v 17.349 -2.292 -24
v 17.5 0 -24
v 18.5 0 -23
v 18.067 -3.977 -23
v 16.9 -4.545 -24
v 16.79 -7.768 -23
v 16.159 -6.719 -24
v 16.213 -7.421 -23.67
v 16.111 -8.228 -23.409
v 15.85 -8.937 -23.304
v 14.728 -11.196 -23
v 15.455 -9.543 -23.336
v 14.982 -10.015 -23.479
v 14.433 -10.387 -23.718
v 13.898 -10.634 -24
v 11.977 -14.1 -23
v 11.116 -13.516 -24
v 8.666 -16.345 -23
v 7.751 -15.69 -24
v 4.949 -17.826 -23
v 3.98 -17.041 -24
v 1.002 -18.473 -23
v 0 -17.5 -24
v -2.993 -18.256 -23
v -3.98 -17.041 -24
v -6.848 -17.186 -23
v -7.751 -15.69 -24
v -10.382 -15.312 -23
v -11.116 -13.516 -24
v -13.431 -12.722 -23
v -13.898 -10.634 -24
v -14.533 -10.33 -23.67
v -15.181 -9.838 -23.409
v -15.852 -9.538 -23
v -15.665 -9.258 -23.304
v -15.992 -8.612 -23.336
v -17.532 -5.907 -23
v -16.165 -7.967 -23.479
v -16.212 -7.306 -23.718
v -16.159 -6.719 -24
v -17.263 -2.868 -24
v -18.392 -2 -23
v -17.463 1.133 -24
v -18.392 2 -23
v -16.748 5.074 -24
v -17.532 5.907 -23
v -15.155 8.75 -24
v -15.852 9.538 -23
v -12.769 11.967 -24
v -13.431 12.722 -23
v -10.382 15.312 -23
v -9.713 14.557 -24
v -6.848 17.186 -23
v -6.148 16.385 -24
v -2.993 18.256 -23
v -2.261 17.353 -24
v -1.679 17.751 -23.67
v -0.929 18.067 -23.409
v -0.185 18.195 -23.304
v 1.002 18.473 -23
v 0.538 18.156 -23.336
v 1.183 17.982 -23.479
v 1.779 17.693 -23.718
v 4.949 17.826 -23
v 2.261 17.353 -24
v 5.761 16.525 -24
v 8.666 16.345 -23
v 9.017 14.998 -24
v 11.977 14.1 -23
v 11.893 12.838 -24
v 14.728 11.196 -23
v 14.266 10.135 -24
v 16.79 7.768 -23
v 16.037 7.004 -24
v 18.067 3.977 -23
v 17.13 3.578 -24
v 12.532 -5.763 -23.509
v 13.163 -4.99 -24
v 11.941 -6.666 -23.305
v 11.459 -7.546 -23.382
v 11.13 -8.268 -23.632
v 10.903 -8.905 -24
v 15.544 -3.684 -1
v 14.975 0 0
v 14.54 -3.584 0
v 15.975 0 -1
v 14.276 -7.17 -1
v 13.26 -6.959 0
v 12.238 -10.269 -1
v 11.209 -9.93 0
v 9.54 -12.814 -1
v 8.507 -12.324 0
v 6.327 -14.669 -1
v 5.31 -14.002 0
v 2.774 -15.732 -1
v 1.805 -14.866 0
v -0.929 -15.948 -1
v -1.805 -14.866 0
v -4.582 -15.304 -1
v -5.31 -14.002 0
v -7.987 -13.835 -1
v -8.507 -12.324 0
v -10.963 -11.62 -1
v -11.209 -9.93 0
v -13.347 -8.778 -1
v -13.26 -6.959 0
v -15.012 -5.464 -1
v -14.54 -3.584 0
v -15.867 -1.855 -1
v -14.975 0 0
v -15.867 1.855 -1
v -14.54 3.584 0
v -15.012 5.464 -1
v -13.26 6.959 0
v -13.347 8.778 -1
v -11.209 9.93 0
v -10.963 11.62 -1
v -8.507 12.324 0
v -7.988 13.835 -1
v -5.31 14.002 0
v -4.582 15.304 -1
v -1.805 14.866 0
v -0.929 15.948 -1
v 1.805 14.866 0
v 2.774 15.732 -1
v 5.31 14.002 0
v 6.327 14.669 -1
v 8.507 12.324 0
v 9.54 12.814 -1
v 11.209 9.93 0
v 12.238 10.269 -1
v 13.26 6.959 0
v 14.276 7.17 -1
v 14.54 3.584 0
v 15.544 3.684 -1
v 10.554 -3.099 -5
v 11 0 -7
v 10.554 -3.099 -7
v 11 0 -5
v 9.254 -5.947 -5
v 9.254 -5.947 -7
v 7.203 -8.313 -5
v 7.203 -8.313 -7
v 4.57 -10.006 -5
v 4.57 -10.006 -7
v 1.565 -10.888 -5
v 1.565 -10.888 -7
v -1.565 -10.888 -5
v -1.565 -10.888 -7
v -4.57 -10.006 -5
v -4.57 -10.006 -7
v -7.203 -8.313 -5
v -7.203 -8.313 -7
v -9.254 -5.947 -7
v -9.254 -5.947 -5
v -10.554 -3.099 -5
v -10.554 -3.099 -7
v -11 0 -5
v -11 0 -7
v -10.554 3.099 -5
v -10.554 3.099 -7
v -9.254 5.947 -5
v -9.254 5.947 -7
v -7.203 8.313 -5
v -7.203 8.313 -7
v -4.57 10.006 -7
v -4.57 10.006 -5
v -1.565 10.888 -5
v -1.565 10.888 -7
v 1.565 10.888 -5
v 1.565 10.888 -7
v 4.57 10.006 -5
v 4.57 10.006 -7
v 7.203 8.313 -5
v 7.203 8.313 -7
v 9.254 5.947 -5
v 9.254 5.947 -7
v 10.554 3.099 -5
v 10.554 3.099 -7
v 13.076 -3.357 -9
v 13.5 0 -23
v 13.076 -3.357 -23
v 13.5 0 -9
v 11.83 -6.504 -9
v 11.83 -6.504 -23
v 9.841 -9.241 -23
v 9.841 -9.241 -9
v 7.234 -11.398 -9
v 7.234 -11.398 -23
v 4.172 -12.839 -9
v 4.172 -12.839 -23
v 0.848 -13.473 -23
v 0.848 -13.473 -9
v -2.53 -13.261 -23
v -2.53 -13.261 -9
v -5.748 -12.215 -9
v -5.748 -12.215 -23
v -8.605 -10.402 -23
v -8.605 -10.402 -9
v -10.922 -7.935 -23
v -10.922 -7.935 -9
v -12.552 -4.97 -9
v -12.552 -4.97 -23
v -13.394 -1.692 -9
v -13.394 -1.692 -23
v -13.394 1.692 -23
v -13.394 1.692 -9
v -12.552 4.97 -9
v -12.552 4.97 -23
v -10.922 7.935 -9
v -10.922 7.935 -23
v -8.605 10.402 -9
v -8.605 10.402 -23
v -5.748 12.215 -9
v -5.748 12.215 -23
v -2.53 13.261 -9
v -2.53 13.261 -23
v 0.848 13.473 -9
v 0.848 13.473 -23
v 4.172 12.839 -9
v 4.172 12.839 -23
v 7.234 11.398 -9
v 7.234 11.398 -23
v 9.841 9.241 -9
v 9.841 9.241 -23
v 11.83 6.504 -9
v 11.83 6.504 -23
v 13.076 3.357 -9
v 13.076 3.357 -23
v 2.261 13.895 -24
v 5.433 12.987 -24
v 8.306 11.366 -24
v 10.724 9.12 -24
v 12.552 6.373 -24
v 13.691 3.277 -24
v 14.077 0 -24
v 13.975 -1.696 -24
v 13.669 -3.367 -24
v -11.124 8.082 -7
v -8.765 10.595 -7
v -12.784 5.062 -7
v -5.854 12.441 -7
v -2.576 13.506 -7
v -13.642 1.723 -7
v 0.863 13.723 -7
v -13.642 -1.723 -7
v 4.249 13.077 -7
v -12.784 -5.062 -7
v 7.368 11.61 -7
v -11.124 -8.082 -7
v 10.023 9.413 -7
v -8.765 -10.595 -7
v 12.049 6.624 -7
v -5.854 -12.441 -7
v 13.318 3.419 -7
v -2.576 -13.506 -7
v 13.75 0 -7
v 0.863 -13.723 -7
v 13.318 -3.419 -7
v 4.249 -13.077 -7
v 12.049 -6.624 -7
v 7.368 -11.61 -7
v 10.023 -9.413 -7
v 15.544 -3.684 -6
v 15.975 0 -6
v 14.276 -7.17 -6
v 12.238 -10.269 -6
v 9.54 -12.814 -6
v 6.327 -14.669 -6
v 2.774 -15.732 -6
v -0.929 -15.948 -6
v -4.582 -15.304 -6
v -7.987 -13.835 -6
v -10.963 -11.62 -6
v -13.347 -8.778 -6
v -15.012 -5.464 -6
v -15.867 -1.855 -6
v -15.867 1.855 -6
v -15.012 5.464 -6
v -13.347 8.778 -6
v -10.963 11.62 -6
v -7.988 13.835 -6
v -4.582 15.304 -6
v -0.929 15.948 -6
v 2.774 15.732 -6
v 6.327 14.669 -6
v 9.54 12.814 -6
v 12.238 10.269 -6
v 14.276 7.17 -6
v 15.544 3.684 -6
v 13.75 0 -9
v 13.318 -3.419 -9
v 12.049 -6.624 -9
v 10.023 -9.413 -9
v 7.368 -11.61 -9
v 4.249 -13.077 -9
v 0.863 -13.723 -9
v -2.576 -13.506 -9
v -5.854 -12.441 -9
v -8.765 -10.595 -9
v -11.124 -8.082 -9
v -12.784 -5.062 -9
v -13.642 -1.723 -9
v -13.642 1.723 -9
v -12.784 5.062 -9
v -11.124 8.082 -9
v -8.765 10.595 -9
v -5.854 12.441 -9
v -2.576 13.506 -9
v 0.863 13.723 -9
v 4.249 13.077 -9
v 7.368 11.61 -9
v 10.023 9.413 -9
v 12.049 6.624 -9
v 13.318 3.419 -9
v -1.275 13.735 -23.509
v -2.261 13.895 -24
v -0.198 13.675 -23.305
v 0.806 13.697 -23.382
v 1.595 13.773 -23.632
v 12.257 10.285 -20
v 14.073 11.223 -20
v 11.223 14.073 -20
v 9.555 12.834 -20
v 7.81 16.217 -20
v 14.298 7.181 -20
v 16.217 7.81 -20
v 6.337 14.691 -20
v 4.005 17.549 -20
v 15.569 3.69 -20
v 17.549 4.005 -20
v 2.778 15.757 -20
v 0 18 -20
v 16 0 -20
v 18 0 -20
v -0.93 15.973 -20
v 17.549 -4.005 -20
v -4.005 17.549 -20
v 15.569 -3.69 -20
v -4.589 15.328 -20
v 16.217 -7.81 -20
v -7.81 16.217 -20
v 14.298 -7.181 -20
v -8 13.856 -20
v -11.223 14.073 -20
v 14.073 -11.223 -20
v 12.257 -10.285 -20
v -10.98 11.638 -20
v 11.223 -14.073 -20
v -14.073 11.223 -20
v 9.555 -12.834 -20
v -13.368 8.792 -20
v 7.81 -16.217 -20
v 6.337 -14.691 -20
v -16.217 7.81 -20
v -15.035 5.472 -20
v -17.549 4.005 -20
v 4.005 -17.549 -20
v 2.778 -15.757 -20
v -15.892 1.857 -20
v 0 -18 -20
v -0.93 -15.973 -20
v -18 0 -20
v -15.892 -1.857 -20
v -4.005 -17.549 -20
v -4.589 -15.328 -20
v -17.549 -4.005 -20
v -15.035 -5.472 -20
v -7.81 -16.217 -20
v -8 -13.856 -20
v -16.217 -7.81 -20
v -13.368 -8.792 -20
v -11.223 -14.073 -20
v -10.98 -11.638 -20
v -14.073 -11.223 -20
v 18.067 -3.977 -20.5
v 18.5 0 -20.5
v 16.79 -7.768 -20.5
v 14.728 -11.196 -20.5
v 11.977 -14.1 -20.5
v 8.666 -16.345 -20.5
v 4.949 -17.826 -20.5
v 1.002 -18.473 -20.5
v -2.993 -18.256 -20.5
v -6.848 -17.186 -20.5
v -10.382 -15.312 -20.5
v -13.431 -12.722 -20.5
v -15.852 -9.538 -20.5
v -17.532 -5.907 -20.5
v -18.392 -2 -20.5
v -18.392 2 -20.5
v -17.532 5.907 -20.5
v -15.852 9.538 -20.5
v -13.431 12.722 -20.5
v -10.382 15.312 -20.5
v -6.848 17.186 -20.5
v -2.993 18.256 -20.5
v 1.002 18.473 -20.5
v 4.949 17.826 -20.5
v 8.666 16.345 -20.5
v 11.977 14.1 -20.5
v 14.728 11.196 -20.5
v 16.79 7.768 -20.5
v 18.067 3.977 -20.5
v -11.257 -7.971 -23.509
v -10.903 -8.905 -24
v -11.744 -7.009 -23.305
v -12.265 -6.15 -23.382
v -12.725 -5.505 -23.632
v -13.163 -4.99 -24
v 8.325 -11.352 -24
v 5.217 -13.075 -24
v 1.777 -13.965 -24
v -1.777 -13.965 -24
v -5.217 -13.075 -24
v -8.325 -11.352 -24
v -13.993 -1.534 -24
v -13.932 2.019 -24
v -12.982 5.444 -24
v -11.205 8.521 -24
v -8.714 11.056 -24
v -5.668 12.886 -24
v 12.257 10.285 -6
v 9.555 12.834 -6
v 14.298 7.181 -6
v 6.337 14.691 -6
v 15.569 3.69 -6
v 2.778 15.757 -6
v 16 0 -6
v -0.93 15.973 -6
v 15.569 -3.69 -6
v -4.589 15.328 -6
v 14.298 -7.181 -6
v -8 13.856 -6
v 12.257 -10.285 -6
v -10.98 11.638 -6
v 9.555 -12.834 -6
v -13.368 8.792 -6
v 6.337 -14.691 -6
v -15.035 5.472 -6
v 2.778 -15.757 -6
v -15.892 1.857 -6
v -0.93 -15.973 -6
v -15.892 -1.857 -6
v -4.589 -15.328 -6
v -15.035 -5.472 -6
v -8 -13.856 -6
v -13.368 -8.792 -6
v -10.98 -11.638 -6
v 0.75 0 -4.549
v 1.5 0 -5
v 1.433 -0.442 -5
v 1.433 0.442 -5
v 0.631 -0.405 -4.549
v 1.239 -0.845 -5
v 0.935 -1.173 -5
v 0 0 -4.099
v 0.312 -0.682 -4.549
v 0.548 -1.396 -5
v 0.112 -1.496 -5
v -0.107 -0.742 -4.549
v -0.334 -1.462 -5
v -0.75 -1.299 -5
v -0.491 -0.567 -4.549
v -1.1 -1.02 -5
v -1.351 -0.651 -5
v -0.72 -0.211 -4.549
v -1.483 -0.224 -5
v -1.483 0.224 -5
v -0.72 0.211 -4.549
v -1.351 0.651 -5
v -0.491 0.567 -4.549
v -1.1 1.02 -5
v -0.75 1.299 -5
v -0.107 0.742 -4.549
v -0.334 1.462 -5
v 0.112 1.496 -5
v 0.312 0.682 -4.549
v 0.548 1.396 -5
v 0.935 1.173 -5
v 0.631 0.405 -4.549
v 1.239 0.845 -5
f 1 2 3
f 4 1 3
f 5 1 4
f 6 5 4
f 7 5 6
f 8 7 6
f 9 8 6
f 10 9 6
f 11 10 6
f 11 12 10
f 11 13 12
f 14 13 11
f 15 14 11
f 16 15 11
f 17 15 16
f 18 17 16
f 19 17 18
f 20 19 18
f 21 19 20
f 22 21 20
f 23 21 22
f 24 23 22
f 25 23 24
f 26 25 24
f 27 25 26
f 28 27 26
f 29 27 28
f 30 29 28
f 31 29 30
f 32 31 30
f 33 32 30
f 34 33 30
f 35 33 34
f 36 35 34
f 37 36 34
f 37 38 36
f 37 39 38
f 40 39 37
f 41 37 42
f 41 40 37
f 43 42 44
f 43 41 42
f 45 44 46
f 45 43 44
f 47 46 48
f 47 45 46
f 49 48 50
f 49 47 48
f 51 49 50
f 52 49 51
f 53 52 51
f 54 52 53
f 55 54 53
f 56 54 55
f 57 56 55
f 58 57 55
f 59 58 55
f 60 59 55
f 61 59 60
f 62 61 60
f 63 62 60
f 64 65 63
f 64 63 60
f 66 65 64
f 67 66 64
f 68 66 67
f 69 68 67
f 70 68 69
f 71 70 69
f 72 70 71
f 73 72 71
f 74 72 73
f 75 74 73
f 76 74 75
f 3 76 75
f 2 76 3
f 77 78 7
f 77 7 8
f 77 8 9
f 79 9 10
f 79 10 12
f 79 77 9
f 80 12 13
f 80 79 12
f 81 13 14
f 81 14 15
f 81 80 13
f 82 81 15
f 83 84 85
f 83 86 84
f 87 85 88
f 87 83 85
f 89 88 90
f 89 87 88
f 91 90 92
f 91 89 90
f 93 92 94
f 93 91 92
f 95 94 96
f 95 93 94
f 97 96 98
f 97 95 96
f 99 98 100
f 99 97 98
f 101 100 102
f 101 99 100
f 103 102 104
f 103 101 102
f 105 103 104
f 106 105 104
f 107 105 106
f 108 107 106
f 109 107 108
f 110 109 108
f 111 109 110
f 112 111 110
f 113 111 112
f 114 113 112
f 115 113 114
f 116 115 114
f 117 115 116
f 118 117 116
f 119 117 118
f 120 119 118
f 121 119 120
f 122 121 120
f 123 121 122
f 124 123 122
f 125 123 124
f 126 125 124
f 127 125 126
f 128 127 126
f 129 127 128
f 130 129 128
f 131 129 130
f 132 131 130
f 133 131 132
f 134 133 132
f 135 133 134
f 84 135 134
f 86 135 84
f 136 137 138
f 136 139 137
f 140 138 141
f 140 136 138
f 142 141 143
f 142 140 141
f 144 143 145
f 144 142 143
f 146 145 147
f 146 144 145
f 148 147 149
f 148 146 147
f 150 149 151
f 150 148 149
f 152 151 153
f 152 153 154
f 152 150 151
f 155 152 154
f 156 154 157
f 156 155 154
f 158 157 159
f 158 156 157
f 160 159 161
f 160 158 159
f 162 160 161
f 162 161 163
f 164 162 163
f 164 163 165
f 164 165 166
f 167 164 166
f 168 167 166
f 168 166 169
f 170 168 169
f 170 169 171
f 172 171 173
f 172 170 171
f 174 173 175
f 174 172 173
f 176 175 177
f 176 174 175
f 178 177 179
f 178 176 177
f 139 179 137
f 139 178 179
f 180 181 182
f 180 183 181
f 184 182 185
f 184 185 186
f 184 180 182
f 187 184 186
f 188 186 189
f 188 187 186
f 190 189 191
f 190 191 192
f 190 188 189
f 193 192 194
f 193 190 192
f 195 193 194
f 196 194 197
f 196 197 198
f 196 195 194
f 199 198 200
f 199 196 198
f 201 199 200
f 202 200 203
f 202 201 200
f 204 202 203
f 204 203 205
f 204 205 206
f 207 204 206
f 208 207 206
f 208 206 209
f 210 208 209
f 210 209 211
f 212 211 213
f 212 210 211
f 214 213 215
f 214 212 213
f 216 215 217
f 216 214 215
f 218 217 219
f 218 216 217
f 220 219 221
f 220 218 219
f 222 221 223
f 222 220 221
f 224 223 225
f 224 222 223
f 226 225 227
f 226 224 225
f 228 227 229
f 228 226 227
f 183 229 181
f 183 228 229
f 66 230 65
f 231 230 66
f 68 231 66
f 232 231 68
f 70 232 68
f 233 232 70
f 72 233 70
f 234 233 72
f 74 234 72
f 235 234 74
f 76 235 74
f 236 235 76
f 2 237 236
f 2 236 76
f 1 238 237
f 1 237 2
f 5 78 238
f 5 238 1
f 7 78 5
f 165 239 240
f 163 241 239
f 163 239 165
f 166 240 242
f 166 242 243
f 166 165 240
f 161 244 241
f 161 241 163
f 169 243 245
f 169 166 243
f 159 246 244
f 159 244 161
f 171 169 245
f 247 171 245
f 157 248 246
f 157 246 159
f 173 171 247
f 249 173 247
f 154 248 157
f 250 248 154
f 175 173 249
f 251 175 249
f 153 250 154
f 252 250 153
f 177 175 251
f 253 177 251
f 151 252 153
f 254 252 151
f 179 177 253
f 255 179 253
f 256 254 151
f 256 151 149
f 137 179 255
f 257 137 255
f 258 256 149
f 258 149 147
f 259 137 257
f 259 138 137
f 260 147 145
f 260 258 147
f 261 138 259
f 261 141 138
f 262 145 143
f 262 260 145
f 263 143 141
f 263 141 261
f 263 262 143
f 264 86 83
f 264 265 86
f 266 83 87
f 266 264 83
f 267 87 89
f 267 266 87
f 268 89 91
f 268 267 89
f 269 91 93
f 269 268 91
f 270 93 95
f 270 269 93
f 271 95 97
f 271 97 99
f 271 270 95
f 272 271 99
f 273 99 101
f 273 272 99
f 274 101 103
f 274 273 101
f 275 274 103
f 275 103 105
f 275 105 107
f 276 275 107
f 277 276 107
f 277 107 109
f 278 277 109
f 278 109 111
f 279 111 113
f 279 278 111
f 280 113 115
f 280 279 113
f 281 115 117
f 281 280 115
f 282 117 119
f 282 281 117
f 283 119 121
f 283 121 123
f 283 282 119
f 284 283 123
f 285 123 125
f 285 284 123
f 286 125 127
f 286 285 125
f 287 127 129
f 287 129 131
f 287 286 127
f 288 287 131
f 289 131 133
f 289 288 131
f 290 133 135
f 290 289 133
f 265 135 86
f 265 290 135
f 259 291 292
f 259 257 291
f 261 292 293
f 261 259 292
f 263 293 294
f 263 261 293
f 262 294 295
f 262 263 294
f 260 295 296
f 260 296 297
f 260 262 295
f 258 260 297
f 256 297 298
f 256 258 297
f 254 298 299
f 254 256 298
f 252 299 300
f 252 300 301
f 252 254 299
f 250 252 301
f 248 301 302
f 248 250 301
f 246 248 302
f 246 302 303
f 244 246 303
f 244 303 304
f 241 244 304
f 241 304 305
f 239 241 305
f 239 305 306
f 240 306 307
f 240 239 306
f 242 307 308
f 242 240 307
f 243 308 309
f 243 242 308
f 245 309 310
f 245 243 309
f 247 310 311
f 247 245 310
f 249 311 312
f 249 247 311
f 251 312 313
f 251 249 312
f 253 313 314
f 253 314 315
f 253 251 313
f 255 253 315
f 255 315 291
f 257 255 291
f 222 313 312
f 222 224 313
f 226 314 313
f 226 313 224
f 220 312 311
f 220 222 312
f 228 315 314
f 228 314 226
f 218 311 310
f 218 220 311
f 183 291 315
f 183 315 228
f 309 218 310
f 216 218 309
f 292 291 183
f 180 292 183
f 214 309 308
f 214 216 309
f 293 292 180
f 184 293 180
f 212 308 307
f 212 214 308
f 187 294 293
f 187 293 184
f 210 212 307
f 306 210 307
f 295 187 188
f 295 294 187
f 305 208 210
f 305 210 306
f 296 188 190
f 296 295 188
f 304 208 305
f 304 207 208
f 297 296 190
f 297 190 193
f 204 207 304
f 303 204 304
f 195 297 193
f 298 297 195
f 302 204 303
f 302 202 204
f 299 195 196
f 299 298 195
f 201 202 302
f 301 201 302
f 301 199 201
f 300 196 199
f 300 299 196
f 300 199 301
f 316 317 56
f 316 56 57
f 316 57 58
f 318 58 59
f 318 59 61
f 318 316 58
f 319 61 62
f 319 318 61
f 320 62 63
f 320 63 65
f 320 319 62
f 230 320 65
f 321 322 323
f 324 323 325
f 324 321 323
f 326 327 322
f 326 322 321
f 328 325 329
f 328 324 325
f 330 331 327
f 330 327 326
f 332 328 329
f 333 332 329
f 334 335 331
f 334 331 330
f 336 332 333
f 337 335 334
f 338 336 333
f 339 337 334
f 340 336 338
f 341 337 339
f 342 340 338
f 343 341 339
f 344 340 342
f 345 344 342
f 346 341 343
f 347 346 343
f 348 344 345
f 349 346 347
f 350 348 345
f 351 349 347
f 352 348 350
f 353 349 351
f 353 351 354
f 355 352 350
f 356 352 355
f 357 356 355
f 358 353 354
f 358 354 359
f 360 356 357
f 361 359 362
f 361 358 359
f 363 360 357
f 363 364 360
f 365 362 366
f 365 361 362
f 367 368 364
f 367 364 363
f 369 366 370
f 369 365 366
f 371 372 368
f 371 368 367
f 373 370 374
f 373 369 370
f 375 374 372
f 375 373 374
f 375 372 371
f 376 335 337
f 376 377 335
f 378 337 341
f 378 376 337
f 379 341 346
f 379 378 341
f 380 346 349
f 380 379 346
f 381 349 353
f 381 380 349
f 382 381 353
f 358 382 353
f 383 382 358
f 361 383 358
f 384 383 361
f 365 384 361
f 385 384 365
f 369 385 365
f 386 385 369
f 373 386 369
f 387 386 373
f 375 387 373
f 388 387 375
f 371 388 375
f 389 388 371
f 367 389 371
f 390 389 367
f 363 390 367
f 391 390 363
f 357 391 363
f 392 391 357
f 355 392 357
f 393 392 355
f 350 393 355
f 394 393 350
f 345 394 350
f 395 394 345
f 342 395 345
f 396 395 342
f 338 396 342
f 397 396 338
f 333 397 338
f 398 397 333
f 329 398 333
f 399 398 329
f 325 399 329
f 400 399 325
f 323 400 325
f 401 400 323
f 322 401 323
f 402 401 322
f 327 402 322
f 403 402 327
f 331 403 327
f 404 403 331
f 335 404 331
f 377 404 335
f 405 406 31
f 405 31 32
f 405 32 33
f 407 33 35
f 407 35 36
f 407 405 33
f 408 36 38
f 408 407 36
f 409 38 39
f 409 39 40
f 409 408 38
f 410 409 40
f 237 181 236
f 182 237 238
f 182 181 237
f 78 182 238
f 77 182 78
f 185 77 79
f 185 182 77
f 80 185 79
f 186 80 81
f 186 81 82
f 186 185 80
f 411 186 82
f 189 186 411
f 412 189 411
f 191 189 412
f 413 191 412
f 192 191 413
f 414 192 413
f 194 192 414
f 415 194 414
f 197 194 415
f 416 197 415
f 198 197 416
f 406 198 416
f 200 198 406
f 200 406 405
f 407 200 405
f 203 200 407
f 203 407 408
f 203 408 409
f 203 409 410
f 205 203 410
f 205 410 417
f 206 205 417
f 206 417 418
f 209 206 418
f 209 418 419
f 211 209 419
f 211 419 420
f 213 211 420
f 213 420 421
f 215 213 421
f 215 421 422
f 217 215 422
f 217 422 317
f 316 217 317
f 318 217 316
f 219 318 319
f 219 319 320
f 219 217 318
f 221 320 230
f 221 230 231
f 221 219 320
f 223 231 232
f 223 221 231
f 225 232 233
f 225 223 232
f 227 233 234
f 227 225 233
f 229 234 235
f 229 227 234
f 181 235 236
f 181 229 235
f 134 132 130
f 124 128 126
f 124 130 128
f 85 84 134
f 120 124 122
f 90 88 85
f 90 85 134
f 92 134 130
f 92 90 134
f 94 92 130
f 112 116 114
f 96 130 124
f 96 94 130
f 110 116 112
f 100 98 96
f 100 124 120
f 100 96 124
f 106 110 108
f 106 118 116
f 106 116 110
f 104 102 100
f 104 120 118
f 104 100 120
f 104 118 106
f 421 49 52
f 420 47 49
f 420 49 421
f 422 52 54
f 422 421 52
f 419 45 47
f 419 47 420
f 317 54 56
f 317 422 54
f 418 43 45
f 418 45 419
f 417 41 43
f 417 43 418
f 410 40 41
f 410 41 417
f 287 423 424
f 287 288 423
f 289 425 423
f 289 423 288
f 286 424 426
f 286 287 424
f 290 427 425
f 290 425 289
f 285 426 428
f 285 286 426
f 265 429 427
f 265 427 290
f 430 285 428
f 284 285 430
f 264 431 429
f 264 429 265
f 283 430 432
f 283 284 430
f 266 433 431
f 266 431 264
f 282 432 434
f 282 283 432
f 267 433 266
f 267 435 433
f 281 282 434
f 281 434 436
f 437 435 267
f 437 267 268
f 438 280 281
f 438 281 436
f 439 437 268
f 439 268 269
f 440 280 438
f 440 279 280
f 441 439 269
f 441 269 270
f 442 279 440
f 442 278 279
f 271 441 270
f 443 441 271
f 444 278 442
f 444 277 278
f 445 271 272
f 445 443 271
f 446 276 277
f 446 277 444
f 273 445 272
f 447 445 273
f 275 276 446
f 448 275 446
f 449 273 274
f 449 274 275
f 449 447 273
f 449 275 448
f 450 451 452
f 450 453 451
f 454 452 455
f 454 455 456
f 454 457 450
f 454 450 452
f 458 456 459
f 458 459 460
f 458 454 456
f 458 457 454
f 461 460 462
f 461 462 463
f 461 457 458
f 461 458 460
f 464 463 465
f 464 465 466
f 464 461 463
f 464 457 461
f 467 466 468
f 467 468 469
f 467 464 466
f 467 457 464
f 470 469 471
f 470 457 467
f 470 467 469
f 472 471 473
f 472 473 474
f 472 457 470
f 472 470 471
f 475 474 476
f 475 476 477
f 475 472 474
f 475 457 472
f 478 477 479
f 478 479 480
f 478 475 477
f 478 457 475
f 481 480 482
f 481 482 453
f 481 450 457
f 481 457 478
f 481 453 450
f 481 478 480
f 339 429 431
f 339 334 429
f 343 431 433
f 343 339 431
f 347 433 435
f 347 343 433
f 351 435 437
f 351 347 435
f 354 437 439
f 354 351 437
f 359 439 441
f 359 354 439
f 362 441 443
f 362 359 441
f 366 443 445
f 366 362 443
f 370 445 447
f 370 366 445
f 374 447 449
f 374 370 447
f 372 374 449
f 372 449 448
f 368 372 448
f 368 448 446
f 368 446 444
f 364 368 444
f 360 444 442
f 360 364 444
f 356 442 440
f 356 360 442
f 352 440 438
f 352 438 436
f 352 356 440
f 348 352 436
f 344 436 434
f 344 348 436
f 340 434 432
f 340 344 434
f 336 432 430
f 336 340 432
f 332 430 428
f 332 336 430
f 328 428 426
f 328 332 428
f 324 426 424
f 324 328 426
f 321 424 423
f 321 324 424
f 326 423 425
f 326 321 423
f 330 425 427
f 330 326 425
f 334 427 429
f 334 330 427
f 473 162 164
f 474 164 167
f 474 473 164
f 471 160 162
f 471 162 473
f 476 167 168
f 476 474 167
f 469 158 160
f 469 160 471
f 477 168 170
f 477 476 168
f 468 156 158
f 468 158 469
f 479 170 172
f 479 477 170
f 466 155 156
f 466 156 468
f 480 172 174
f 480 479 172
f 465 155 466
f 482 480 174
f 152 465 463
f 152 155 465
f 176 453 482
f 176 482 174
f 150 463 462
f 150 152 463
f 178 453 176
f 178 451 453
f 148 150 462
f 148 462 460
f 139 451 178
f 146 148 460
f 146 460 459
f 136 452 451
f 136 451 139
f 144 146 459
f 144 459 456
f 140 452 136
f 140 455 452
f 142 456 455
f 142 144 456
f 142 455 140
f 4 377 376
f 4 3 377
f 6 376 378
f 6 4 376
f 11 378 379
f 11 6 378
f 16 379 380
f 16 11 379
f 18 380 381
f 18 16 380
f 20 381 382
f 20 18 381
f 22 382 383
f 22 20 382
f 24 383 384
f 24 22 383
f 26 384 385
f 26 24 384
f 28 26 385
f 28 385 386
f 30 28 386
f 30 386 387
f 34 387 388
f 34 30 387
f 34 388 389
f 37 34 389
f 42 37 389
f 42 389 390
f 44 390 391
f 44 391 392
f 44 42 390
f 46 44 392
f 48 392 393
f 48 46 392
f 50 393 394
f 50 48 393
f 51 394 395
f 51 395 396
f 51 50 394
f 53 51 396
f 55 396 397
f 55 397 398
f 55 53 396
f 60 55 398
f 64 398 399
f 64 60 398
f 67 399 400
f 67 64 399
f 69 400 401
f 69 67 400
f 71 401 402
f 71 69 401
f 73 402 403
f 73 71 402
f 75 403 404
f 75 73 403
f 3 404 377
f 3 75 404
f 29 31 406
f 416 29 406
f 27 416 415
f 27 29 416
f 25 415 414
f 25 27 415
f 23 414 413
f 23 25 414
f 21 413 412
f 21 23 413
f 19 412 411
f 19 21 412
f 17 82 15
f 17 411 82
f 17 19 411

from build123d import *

# Parameters (mm, degrees)
SKETCH2_R          = 4
CUT_EXTRUDE3_DEPTH = 36.503520952
CIRPATTERN1_COUNT  = 3


with BuildPart() as part:
    # Sketch1 → Revolve2 (revolve)
    with BuildSketch(Plane(origin=(0, 0, 0), x_dir=(0, 0, -1), z_dir=(1, 0, 0)), mode=Mode.PRIVATE) as revolve2_sk:
        Polygon((0, 0), (0, 14.975), (1, 15.975), (6, 15.975), (6, 16), (20, 16), (20, 18), (20.5, 18.5), (23, 18.5), (24, 17.5), (24, 14.077350269), (23, 13.5), (9, 13.5), (9, 13.75), (7, 13.75), (7, 11), (5, 11), (5, 1.5), (4.098709071, 0), align=None)
    revolve(revolve2_sk.sketch.rotate(Axis((0, 0, 0), (0, 0, -1)), 90), axis=Axis((0, 0, 0), (0, 0, -1)))

    # Sketch2 → Cut-Extrude3 (cut, through all)
    with BuildSketch(Plane(origin=(0, 0, 0), x_dir=(0, 0, -1), z_dir=(0, 1, 0))):
        with Locations((27.3, 0)):
            Circle(SKETCH2_R)
    cut_extrude3 = extrude(amount=CUT_EXTRUDE3_DEPTH, mode=Mode.SUBTRACT)

    # CirPattern1: Cut-Extrude3 ×3 about axis
    cirpattern1_axis = Axis((0, 0, -4.098709071), (0, 0, -1))
    for i in range(1, CIRPATTERN1_COUNT):
        add(cut_extrude3.rotate(cirpattern1_axis, i * 360 / CIRPATTERN1_COUNT), mode=Mode.SUBTRACT)


solid = part.part
